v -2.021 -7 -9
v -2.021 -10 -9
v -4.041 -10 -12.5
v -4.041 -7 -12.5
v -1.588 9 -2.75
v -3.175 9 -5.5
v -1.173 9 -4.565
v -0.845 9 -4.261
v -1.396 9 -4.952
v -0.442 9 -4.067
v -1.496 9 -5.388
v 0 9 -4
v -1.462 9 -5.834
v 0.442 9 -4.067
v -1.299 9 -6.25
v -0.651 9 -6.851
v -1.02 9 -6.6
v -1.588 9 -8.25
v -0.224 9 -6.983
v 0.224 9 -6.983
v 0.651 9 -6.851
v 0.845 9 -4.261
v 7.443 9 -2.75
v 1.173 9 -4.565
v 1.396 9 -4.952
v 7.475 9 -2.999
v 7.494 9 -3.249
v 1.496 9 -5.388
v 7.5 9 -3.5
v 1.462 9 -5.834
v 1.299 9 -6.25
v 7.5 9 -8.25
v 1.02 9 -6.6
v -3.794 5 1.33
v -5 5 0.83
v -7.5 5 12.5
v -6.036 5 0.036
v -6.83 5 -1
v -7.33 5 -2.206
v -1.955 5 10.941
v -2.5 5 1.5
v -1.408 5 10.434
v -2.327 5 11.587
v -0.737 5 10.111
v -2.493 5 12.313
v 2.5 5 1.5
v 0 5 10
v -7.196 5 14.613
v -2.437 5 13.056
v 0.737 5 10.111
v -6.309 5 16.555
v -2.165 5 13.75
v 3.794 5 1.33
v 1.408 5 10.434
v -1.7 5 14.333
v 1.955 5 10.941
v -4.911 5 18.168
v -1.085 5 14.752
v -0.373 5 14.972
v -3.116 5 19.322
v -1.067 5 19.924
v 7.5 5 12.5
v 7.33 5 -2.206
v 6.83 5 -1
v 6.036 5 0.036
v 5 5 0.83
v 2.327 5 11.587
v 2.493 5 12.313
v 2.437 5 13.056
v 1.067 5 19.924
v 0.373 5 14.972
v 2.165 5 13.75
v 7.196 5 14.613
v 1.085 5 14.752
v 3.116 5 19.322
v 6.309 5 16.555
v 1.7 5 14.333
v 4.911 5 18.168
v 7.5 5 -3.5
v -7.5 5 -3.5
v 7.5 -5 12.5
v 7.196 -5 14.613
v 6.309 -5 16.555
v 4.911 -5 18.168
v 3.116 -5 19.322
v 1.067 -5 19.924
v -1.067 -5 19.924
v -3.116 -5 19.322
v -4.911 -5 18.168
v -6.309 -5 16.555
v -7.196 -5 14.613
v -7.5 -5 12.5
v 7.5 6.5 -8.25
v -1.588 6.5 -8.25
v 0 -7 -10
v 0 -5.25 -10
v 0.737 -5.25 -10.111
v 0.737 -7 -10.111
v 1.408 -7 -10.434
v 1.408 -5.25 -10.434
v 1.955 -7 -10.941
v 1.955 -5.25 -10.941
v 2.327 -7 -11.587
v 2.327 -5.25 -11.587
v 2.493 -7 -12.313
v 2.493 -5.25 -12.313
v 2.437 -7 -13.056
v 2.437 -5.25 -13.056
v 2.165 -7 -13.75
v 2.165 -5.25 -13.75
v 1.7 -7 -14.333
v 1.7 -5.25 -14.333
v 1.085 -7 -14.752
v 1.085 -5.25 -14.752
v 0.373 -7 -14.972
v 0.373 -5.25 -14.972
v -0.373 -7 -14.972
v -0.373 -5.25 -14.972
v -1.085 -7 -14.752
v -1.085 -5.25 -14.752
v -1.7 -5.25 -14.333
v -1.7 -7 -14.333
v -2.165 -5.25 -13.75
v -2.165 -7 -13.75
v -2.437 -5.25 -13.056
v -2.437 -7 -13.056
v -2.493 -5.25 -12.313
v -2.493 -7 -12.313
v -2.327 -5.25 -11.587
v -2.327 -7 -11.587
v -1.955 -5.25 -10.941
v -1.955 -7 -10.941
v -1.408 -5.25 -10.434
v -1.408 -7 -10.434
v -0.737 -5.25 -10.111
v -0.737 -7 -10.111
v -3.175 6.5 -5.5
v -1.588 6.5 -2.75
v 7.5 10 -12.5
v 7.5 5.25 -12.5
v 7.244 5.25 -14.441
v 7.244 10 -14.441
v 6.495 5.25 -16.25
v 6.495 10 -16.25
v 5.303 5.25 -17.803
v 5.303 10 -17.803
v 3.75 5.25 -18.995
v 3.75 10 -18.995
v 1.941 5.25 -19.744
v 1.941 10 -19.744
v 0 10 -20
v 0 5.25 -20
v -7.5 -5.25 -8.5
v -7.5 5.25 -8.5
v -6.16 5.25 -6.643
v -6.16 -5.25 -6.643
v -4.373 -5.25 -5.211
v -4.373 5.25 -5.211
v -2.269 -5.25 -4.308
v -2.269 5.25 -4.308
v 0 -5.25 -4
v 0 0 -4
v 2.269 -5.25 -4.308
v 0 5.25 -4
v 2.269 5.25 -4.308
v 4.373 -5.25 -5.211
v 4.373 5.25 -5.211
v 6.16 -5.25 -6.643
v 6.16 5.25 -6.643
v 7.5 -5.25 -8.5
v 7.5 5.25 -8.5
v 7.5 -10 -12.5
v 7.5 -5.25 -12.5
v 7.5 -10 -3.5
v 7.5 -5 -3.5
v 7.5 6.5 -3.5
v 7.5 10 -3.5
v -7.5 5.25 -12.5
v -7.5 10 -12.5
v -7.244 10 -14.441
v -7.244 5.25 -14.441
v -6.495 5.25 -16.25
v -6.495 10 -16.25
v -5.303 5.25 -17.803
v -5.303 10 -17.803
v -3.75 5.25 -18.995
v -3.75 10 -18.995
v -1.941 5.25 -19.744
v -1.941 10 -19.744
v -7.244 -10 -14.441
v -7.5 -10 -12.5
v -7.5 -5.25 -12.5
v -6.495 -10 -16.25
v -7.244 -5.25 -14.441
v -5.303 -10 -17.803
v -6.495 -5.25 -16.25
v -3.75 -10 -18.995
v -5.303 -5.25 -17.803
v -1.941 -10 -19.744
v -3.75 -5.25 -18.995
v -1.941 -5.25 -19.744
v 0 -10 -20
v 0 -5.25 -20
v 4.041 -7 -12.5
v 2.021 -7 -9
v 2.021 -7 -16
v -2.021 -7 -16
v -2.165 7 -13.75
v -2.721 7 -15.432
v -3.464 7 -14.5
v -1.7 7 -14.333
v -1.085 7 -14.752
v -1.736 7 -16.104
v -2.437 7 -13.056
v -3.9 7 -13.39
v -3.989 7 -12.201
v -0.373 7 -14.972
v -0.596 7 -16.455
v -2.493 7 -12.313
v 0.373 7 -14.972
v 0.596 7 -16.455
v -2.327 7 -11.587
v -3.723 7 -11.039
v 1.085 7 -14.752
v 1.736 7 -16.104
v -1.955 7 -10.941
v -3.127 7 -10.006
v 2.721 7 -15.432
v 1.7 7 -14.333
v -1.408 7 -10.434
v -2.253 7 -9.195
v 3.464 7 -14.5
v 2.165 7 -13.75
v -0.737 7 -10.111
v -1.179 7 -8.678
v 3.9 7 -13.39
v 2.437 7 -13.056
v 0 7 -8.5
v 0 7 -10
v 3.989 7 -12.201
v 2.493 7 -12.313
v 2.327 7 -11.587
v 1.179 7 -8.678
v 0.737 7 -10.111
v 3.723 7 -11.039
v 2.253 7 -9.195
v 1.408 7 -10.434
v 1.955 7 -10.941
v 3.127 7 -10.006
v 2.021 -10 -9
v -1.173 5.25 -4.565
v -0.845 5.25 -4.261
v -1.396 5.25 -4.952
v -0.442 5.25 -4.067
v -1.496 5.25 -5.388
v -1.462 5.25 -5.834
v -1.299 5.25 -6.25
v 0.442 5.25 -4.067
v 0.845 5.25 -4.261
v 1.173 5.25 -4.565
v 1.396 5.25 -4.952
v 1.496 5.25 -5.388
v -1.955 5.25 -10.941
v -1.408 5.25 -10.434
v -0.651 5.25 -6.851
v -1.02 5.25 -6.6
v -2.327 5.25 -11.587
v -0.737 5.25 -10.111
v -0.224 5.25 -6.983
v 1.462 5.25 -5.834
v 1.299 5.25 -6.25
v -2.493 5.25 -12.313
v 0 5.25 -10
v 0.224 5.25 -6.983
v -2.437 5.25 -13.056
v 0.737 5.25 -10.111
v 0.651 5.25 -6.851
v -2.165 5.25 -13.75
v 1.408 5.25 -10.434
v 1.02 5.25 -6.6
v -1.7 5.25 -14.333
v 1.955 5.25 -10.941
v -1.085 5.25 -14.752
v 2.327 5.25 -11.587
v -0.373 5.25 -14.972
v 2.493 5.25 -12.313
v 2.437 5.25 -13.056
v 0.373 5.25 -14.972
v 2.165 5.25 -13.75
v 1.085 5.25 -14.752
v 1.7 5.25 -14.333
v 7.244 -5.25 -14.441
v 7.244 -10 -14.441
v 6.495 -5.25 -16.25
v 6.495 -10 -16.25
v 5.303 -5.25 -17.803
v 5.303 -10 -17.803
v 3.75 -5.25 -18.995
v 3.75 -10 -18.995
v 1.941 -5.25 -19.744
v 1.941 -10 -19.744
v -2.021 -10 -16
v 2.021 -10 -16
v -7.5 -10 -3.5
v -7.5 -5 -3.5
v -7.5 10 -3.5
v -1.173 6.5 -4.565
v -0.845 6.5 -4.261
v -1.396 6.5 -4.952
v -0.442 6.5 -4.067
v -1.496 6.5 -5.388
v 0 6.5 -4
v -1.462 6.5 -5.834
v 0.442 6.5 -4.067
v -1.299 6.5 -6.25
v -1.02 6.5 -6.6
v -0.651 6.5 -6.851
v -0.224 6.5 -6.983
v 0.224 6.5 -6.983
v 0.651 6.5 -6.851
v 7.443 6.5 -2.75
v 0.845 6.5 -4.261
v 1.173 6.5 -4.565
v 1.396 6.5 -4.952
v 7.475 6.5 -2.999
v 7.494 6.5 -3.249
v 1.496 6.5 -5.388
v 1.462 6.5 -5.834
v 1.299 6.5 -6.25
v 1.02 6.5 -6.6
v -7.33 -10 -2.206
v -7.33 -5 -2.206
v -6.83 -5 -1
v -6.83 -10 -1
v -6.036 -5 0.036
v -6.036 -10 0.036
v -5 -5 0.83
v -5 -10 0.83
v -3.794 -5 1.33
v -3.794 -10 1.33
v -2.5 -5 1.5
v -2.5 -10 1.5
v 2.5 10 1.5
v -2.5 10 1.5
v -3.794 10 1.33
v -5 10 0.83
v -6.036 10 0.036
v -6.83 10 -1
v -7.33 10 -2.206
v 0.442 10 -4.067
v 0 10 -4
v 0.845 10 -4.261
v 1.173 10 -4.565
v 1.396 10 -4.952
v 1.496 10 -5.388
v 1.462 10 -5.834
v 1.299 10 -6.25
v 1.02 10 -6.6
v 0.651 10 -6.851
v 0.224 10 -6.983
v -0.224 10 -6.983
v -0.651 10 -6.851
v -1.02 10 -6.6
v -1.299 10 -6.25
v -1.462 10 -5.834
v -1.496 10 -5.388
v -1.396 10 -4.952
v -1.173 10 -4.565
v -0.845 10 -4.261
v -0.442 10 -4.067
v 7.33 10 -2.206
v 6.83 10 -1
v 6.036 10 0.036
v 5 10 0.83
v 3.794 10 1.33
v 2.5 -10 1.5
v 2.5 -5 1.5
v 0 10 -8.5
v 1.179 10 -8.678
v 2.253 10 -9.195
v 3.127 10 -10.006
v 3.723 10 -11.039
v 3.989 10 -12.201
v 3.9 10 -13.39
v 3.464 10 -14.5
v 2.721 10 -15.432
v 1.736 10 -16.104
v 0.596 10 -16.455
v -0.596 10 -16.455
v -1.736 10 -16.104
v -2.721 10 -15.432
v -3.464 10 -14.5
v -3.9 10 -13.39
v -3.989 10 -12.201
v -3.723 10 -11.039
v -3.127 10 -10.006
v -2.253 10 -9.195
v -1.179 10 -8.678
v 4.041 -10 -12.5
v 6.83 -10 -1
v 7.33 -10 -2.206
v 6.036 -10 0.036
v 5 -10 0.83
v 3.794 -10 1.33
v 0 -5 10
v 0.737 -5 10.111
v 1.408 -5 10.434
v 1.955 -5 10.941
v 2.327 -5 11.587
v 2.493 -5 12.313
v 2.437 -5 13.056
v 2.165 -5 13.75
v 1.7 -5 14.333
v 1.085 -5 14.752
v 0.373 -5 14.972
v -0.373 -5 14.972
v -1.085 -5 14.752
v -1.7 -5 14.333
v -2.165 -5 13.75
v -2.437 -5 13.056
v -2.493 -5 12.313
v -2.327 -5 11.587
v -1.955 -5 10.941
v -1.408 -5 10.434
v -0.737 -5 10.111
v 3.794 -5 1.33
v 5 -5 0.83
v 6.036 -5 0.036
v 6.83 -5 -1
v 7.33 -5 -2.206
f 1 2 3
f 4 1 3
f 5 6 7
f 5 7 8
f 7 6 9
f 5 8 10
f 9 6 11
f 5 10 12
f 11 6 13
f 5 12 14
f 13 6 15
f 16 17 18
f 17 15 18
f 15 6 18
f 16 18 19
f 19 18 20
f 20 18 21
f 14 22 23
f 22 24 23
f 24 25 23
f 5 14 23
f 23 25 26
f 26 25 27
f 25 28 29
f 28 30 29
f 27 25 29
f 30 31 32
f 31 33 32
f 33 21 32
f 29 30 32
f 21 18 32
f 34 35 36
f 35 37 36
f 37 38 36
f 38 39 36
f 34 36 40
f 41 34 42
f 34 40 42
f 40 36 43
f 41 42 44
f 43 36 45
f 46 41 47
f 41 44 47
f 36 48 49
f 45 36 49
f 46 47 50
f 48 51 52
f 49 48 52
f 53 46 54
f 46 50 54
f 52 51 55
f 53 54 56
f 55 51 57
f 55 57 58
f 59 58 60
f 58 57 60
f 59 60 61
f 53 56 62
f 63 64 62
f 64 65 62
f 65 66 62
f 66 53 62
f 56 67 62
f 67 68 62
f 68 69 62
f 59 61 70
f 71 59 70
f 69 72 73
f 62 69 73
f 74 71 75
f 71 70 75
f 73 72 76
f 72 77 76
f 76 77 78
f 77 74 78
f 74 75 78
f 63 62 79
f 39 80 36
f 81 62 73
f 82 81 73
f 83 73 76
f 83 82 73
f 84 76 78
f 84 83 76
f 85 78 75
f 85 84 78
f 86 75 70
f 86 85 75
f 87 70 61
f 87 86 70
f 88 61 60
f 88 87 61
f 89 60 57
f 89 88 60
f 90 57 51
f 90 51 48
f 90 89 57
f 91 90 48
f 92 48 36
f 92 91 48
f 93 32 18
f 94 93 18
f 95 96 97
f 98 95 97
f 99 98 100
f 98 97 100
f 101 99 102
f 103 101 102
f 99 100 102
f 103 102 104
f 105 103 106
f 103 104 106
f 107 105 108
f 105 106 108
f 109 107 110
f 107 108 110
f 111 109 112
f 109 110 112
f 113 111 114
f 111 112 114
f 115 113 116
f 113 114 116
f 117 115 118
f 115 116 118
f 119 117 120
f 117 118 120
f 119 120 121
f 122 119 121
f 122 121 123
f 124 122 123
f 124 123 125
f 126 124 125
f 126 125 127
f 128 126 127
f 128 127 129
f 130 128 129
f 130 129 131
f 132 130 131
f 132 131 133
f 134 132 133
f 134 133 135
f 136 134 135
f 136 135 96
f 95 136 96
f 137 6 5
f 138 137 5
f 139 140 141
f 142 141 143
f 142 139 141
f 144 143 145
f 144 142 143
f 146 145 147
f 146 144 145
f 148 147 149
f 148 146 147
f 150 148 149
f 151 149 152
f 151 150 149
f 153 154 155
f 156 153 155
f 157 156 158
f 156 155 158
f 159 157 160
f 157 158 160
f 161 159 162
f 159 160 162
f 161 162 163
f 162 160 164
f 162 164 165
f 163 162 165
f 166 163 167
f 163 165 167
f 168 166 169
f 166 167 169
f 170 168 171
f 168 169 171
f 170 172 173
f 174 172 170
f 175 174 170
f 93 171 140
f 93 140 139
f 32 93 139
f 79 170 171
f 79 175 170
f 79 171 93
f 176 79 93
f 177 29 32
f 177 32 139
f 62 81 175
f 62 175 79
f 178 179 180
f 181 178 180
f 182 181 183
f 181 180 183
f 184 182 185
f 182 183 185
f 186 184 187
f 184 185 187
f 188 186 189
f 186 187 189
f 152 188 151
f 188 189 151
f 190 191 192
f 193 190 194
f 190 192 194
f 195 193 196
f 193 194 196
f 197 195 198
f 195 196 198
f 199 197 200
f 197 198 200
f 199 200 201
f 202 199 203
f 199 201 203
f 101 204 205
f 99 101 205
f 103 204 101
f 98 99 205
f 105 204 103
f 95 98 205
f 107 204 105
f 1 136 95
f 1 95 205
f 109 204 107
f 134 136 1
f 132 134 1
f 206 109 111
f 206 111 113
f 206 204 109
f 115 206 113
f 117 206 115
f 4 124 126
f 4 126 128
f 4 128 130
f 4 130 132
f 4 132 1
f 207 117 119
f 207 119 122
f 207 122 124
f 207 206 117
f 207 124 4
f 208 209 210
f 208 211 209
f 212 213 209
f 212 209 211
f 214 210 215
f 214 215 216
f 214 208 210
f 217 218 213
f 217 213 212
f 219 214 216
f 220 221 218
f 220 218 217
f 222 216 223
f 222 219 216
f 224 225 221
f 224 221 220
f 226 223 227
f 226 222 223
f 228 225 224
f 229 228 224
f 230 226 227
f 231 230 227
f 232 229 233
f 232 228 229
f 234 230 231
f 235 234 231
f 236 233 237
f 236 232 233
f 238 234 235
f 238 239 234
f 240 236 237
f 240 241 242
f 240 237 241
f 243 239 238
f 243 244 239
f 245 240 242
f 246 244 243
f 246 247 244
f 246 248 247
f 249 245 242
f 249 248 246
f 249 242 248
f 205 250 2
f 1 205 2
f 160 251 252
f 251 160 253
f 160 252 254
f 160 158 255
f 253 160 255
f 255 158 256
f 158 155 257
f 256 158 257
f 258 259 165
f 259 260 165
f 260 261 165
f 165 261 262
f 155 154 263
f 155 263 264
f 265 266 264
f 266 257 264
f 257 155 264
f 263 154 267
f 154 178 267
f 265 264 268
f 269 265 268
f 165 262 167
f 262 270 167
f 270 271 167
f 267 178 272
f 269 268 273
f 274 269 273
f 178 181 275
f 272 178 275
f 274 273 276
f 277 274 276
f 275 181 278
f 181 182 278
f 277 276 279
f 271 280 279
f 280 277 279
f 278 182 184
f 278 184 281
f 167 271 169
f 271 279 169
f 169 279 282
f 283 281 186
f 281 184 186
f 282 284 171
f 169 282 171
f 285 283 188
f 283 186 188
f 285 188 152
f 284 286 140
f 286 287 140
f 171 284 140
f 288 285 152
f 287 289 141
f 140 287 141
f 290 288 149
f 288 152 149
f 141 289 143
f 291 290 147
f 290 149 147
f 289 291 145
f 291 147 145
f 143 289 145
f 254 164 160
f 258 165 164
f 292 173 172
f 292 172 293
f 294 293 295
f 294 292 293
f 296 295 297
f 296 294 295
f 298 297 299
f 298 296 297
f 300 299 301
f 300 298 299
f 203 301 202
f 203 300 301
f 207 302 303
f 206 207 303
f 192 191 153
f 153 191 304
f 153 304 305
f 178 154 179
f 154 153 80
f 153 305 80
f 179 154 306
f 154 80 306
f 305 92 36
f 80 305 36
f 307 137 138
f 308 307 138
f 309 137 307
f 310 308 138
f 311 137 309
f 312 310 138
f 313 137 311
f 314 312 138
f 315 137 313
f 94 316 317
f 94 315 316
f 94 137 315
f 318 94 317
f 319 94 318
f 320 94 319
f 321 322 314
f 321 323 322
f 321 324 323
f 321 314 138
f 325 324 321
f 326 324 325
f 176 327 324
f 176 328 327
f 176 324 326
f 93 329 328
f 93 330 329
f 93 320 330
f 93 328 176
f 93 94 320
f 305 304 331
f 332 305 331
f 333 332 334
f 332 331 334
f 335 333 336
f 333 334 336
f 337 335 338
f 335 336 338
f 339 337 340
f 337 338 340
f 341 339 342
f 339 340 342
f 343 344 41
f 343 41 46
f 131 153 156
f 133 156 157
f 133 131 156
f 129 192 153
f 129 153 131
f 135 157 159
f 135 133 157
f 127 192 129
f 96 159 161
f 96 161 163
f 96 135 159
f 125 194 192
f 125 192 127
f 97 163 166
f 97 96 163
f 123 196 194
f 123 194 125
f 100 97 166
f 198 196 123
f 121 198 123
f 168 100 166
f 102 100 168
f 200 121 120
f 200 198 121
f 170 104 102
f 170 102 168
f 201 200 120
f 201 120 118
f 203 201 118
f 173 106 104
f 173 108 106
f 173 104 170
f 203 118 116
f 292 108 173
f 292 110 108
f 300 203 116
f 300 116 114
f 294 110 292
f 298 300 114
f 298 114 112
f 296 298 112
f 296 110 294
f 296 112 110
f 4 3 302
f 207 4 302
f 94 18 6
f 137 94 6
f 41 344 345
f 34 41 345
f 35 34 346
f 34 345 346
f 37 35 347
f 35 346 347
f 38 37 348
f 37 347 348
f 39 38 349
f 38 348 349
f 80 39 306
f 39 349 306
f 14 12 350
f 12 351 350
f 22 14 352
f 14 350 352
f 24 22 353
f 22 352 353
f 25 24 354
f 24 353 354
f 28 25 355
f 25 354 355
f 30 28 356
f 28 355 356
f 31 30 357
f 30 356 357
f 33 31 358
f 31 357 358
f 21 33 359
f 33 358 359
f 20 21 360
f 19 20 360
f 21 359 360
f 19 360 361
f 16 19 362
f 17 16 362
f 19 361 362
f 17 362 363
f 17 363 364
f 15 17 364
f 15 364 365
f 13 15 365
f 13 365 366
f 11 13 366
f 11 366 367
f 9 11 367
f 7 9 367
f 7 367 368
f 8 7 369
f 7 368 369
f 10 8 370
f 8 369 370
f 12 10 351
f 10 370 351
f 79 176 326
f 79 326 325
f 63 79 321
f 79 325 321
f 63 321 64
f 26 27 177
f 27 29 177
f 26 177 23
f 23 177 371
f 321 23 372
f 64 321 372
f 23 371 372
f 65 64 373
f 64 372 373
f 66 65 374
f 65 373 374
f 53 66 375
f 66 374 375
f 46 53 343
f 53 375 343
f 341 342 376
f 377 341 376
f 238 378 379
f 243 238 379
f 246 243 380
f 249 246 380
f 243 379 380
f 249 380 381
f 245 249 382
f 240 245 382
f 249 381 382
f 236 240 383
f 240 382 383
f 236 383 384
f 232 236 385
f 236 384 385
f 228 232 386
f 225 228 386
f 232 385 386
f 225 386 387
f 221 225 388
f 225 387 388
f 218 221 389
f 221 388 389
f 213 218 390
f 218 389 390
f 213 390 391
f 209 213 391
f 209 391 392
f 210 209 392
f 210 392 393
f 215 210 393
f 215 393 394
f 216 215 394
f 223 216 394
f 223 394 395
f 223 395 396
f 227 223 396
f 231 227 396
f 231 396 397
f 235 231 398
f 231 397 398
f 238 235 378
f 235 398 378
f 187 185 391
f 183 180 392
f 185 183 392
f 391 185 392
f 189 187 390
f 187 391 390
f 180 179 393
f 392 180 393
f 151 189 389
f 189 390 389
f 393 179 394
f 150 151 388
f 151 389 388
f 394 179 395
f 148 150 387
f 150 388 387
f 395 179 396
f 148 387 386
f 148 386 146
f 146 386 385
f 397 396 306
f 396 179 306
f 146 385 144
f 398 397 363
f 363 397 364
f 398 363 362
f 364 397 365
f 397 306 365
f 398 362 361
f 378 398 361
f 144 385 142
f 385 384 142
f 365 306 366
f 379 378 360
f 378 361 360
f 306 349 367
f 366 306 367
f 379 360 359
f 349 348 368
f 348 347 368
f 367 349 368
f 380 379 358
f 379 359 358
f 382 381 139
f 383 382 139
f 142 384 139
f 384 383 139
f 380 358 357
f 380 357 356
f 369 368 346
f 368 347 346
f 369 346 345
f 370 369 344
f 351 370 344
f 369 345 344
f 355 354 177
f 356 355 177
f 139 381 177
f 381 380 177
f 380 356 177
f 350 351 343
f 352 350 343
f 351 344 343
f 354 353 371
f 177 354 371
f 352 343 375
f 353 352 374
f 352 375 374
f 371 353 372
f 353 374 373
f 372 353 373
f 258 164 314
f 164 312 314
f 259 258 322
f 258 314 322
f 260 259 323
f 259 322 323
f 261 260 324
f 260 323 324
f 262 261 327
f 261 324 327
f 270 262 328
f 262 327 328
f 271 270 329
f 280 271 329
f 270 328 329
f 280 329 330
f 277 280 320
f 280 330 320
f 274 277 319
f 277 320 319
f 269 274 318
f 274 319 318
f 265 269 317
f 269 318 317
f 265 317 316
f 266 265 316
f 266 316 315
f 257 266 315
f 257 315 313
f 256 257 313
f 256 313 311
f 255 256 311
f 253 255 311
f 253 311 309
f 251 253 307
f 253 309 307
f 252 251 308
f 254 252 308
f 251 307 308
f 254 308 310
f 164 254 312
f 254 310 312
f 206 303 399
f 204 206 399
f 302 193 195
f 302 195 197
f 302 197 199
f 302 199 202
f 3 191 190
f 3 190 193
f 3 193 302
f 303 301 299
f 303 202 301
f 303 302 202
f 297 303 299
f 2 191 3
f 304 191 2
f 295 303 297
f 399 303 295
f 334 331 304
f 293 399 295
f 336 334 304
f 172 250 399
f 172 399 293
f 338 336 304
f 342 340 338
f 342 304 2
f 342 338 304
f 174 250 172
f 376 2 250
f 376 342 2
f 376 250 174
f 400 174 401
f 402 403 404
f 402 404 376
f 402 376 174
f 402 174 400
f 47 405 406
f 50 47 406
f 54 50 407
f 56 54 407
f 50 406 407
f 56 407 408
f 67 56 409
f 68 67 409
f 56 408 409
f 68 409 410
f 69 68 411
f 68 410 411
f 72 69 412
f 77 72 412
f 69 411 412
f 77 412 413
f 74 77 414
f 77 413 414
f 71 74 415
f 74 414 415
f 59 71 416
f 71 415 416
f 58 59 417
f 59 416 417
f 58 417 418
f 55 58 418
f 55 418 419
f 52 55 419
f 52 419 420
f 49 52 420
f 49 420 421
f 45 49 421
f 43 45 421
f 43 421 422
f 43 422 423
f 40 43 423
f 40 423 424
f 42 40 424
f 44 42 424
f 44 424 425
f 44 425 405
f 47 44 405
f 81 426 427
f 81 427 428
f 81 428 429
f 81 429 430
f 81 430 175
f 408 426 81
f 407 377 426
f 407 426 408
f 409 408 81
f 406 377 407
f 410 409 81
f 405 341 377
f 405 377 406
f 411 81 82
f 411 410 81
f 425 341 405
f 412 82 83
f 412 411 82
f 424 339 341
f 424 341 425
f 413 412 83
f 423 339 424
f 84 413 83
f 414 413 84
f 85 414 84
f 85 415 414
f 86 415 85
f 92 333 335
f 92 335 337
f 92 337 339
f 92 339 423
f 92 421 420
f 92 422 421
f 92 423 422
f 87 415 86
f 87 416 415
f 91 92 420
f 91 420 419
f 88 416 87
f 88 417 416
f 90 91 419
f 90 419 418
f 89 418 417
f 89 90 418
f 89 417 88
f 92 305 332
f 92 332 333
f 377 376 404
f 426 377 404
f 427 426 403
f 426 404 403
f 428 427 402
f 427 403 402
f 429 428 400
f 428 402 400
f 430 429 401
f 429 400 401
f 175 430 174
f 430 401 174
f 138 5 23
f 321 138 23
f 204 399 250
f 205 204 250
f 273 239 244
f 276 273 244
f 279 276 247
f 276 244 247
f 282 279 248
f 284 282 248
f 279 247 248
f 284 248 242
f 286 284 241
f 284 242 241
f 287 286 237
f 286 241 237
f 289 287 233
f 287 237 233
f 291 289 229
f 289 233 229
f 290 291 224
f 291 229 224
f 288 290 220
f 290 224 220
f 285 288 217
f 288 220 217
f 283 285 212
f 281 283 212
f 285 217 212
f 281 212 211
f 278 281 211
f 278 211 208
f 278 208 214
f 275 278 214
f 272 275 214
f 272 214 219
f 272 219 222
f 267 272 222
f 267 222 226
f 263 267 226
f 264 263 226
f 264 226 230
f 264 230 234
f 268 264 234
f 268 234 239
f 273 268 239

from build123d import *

# Parameters (mm, degrees)
SKETCH1_W           = 15
SKETCH1_H           = 20
BOSS_EXTRUDE1_DEPTH = 20
FILLET1_R           = 7.5
CUT_EXTRUDE1_START  = -4.75
SKETCH3_R           = 8.5
CUT_EXTRUDE1_DEPTH  = 10.5
SKETCH4_R           = 2.5
CUT_EXTRUDE2_DEPTH  = 30.261749777
CUT_EXTRUDE3_DEPTH  = 3
SKETCH6_R           = 4
CUT_EXTRUDE4_DEPTH  = 3
CUT_EXTRUDE5_DEPTH  = 30.261749777
SKETCH8_R           = 8.5
CUT_EXTRUDE6_DEPTH  = 5
SKETCH9_R           = 2.5
CUT_EXTRUDE7_DEPTH  = 27.100766272
CUT_EXTRUDE8_START  = -1
CUT_EXTRUDE8_DEPTH  = 2.5
SKETCH11_R          = 1.5
CUT_EXTRUDE9_DEPTH  = 10
SKETCH12_W          = 15
SKETCH12_H          = 7
CUT_EXTRUDE10_DEPTH = 5
SKETCH13_W          = 15
SKETCH13_H          = 7
CUT_EXTRUDE11_DEPTH = 5
FILLET2_R           = 5


# Some blends are built 0.0001 mm under size
with BuildPart() as part:
    # Sketch1 → Boss-Extrude1 (new, symmetric)
    with BuildSketch(Plane.XY):
        Rectangle(SKETCH1_W, SKETCH1_H)
    extrude(amount=BOSS_EXTRUDE1_DEPTH, both=True)

    # Fillet1
    fillet1_edges = [part.edges().sort_by_distance(p)[0] for p in [
        (-7.5, 0, -20),
        (7.5, 0, -20),
    ]]
    fillet(fillet1_edges, radius=FILLET1_R - 0.0001)  # a hair under: the kernel refuses the full size

    # Sketch3 → Cut-Extrude1 (cut)
    with BuildSketch(Plane(origin=(0, 10, 0), x_dir=(1, 0, 0), z_dir=(0, 1, 0)).offset(CUT_EXTRUDE1_START)):
        with Locations((0, 12.5)):
            Circle(SKETCH3_R)
    extrude(amount=-CUT_EXTRUDE1_DEPTH, mode=Mode.SUBTRACT)

    # Sketch4 → Cut-Extrude2 (cut, through all)
    with BuildSketch(Plane(origin=(0, 10, 0), x_dir=(1, 0, 0), z_dir=(0, 1, 0))):
        with Locations(Location((0, 12.5, 0), (0, 0, 270))):
            Circle(SKETCH4_R)
    extrude(amount=-CUT_EXTRUDE2_DEPTH, mode=Mode.SUBTRACT)

    # Sketch5 → Cut-Extrude3 (cut)
    with BuildSketch(Plane(origin=(0, -10, 0), x_dir=(-1, 0, 0), z_dir=(0, -1, 0))):
        Polygon((-2.020725942, 16), (-4.041451884, 12.5), (-2.020725942, 9), (2.020725942, 9), (4.041451884, 12.5), (2.020725942, 16), align=None)
    extrude(amount=-CUT_EXTRUDE3_DEPTH, mode=Mode.SUBTRACT)

    # Sketch6 → Cut-Extrude4 (cut)
    with BuildSketch(Plane(origin=(0, 10, 0), x_dir=(1, 0, 0), z_dir=(0, 1, 0))):
        with Locations(Location((0, 12.5, 0), (0, 0, 270))):
            Circle(SKETCH6_R)
    extrude(amount=-CUT_EXTRUDE4_DEPTH, mode=Mode.SUBTRACT)

    # Sketch7 → Cut-Extrude5 (cut, through all)
    with BuildSketch(Plane.XZ.offset(10)):
        with BuildLine():
            Line((-7.5, 12.5), (-7.5, 22.5))
            Line((-7.5, 22.5), (7.5, 22.5))
            Line((7.5, 22.5), (7.5, 12.5))
            ThreePointArc((7.5, 12.5), (0, 20), (-7.5, 12.5))
        make_face()
    extrude(amount=-CUT_EXTRUDE5_DEPTH, mode=Mode.SUBTRACT)

    # Sketch8 → Cut-Extrude6 (cut)
    with BuildSketch(Plane.XZ.offset(10)):
        with Locations((0, 12.5)):
            Circle(SKETCH8_R)
    cut_extrude6 = extrude(amount=-CUT_EXTRUDE6_DEPTH, mode=Mode.SUBTRACT)

    # Mirror3: Cut-Extrude6 across plane
    add(cut_extrude6.mirror(Plane.ZX), mode=Mode.SUBTRACT)

    # Sketch9 → Cut-Extrude7 (cut, through all)
    with BuildSketch(Plane.XZ.offset(5)):
        with Locations(Location((0, 12.5, 0), (0, 0, 270))):
            Circle(SKETCH9_R)
    extrude(amount=-CUT_EXTRUDE7_DEPTH, mode=Mode.SUBTRACT)

    # Sketch10 → Cut-Extrude8 (cut)
    with BuildSketch(Plane(origin=(0, 10, 0), x_dir=(1, 0, 0), z_dir=(0, 1, 0)).offset(CUT_EXTRUDE8_START)):
        Polygon((1.58771324, 2.75), (7.5, 2.75), (7.5, 8.25), (1.58771324, 8.25), (-1.58771324, 8.25), (-3.175426481, 5.5), (-1.58771324, 2.75), align=None)
    extrude(amount=-CUT_EXTRUDE8_DEPTH, mode=Mode.SUBTRACT)

    # Sketch11 → Cut-Extrude9 (cut)
    with BuildSketch(Plane(origin=(0, 10, 0), x_dir=(1, 0, 0), z_dir=(0, 1, 0))):
        with Locations(Location((0, 5.5, 0), (0, 0, 270))):
            Circle(SKETCH11_R)
    extrude(amount=-CUT_EXTRUDE9_DEPTH, mode=Mode.SUBTRACT)

    # Sketch12 → Cut-Extrude10 (cut)
    with BuildSketch(Plane(origin=(0, 10, 0), x_dir=(1, 0, 0), z_dir=(0, 1, 0))):
        with Locations((0, -5)):
            Rectangle(SKETCH12_W, SKETCH12_H)
    extrude(amount=-CUT_EXTRUDE10_DEPTH, mode=Mode.SUBTRACT)

    # Sketch13 → Cut-Extrude11 (cut)
    with BuildSketch(Plane.XZ.offset(10)):
        with Locations((0, 5)):
            Rectangle(SKETCH13_W, SKETCH13_H)
    extrude(amount=-CUT_EXTRUDE11_DEPTH, mode=Mode.SUBTRACT)

    # Fillet2
    # the kernel refuses this fillet: 5 mm, written as the material it takes off along each edge
    with BuildSketch(Plane(origin=(-7.5, 22.5, 1.5), x_dir=(1, 0, 0), z_dir=(0, -1, 0)), Plane(origin=(7.5, -22.5, 1.5), x_dir=(-1, 0, 0), z_dir=(0, 1, 0)), Plane(origin=(-7.5, -22.5, 1.5), x_dir=(0, 0, -1), z_dir=(0, 1, 0))) as fillet2_piece_1:
        with BuildLine():
            CenterArc((FILLET2_R, -FILLET2_R), FILLET2_R, 90, 90)
            Line((0, -FILLET2_R), (0, 0))
            Line((0, 0), (FILLET2_R, 0))
        make_face()
    extrude(amount=17.5, mode=Mode.SUBTRACT)
    with BuildSketch(Plane(origin=(-7.5, 22.5, 1.5), x_dir=(1, 0, 0), z_dir=(0, -1, 0))) as fillet2_piece_2_section:
        with BuildLine():
            CenterArc((FILLET2_R, -FILLET2_R), FILLET2_R, 90, 90)
            Line((0, -FILLET2_R), (0, 0))
            Line((0, 0), (FILLET2_R, 0))
        make_face()
    fillet2_piece_2 = extrude(amount=30, mode=Mode.PRIVATE)
    fillet2_piece_2 = split(fillet2_piece_2, bisect_by=Plane(origin=(-6.368024429, -5, 0.368024429), z_dir=(0, -1, 0)), keep=Keep.TOP, mode=Mode.PRIVATE)
    add(fillet2_piece_2, mode=Mode.SUBTRACT)
    with BuildSketch(Plane(origin=(7.5, 22.5, 1.5), x_dir=(-1, 0, 0), z_dir=(0, -1, 0))) as fillet2_piece_3:
        with BuildLine():
            CenterArc((FILLET2_R, FILLET2_R), FILLET2_R, 180, 90)
            Line((0, FILLET2_R), (0, 0))
            Line((0, 0), (FILLET2_R, 0))
        make_face()
    extrude(amount=17.5, mode=Mode.SUBTRACT)
    with BuildSketch(Plane(origin=(7.5, 22.5, 1.5), x_dir=(-1, 0, 0), z_dir=(0, -1, 0))) as fillet2_piece_4_section:
        with BuildLine():
            CenterArc((FILLET2_R, FILLET2_R), FILLET2_R, 180, 90)
            Line((0, FILLET2_R), (0, 0))
            Line((0, 0), (FILLET2_R, 0))
        make_face()
    fillet2_piece_4 = extrude(amount=30, mode=Mode.PRIVATE)
    fillet2_piece_4 = split(fillet2_piece_4, bisect_by=Plane(origin=(6.368024429, -5, 0.368024429), z_dir=(0, -1, 0)), keep=Keep.TOP, mode=Mode.PRIVATE)
    add(fillet2_piece_4, mode=Mode.SUBTRACT)
    with BuildSketch(Plane(origin=(7.5, -22.5, 1.5), x_dir=(-1, 0, 0), z_dir=(0, 1, 0))) as fillet2_piece_5_section:
        with BuildLine():
            CenterArc((FILLET2_R, -FILLET2_R), FILLET2_R, 90, 90)
            Line((0, -FILLET2_R), (0, 0))
            Line((0, 0), (FILLET2_R, 0))
        make_face()
    fillet2_piece_5 = extrude(amount=30, mode=Mode.PRIVATE)
    fillet2_piece_5 = split(fillet2_piece_5, bisect_by=Plane(origin=(6.368024429, 5, 0.368024429), z_dir=(0, 1, 0)), keep=Keep.TOP, mode=Mode.PRIVATE)
    add(fillet2_piece_5, mode=Mode.SUBTRACT)
    with BuildSketch(Plane(origin=(-7.5, -22.5, 1.5), x_dir=(0, 0, -1), z_dir=(0, 1, 0))) as fillet2_piece_6_section:
        with BuildLine():
            CenterArc((FILLET2_R, -FILLET2_R), FILLET2_R, 90, 90)
            Line((0, -FILLET2_R), (0, 0))
            Line((0, 0), (FILLET2_R, 0))
        make_face()
    fillet2_piece_6 = extrude(amount=30, mode=Mode.PRIVATE)
    fillet2_piece_6 = split(fillet2_piece_6, bisect_by=Plane(origin=(-6.368024429, 5, 0.368024429), z_dir=(0, 1, 0)), keep=Keep.TOP, mode=Mode.PRIVATE)
    add(fillet2_piece_6, mode=Mode.SUBTRACT)


solid = part.part
